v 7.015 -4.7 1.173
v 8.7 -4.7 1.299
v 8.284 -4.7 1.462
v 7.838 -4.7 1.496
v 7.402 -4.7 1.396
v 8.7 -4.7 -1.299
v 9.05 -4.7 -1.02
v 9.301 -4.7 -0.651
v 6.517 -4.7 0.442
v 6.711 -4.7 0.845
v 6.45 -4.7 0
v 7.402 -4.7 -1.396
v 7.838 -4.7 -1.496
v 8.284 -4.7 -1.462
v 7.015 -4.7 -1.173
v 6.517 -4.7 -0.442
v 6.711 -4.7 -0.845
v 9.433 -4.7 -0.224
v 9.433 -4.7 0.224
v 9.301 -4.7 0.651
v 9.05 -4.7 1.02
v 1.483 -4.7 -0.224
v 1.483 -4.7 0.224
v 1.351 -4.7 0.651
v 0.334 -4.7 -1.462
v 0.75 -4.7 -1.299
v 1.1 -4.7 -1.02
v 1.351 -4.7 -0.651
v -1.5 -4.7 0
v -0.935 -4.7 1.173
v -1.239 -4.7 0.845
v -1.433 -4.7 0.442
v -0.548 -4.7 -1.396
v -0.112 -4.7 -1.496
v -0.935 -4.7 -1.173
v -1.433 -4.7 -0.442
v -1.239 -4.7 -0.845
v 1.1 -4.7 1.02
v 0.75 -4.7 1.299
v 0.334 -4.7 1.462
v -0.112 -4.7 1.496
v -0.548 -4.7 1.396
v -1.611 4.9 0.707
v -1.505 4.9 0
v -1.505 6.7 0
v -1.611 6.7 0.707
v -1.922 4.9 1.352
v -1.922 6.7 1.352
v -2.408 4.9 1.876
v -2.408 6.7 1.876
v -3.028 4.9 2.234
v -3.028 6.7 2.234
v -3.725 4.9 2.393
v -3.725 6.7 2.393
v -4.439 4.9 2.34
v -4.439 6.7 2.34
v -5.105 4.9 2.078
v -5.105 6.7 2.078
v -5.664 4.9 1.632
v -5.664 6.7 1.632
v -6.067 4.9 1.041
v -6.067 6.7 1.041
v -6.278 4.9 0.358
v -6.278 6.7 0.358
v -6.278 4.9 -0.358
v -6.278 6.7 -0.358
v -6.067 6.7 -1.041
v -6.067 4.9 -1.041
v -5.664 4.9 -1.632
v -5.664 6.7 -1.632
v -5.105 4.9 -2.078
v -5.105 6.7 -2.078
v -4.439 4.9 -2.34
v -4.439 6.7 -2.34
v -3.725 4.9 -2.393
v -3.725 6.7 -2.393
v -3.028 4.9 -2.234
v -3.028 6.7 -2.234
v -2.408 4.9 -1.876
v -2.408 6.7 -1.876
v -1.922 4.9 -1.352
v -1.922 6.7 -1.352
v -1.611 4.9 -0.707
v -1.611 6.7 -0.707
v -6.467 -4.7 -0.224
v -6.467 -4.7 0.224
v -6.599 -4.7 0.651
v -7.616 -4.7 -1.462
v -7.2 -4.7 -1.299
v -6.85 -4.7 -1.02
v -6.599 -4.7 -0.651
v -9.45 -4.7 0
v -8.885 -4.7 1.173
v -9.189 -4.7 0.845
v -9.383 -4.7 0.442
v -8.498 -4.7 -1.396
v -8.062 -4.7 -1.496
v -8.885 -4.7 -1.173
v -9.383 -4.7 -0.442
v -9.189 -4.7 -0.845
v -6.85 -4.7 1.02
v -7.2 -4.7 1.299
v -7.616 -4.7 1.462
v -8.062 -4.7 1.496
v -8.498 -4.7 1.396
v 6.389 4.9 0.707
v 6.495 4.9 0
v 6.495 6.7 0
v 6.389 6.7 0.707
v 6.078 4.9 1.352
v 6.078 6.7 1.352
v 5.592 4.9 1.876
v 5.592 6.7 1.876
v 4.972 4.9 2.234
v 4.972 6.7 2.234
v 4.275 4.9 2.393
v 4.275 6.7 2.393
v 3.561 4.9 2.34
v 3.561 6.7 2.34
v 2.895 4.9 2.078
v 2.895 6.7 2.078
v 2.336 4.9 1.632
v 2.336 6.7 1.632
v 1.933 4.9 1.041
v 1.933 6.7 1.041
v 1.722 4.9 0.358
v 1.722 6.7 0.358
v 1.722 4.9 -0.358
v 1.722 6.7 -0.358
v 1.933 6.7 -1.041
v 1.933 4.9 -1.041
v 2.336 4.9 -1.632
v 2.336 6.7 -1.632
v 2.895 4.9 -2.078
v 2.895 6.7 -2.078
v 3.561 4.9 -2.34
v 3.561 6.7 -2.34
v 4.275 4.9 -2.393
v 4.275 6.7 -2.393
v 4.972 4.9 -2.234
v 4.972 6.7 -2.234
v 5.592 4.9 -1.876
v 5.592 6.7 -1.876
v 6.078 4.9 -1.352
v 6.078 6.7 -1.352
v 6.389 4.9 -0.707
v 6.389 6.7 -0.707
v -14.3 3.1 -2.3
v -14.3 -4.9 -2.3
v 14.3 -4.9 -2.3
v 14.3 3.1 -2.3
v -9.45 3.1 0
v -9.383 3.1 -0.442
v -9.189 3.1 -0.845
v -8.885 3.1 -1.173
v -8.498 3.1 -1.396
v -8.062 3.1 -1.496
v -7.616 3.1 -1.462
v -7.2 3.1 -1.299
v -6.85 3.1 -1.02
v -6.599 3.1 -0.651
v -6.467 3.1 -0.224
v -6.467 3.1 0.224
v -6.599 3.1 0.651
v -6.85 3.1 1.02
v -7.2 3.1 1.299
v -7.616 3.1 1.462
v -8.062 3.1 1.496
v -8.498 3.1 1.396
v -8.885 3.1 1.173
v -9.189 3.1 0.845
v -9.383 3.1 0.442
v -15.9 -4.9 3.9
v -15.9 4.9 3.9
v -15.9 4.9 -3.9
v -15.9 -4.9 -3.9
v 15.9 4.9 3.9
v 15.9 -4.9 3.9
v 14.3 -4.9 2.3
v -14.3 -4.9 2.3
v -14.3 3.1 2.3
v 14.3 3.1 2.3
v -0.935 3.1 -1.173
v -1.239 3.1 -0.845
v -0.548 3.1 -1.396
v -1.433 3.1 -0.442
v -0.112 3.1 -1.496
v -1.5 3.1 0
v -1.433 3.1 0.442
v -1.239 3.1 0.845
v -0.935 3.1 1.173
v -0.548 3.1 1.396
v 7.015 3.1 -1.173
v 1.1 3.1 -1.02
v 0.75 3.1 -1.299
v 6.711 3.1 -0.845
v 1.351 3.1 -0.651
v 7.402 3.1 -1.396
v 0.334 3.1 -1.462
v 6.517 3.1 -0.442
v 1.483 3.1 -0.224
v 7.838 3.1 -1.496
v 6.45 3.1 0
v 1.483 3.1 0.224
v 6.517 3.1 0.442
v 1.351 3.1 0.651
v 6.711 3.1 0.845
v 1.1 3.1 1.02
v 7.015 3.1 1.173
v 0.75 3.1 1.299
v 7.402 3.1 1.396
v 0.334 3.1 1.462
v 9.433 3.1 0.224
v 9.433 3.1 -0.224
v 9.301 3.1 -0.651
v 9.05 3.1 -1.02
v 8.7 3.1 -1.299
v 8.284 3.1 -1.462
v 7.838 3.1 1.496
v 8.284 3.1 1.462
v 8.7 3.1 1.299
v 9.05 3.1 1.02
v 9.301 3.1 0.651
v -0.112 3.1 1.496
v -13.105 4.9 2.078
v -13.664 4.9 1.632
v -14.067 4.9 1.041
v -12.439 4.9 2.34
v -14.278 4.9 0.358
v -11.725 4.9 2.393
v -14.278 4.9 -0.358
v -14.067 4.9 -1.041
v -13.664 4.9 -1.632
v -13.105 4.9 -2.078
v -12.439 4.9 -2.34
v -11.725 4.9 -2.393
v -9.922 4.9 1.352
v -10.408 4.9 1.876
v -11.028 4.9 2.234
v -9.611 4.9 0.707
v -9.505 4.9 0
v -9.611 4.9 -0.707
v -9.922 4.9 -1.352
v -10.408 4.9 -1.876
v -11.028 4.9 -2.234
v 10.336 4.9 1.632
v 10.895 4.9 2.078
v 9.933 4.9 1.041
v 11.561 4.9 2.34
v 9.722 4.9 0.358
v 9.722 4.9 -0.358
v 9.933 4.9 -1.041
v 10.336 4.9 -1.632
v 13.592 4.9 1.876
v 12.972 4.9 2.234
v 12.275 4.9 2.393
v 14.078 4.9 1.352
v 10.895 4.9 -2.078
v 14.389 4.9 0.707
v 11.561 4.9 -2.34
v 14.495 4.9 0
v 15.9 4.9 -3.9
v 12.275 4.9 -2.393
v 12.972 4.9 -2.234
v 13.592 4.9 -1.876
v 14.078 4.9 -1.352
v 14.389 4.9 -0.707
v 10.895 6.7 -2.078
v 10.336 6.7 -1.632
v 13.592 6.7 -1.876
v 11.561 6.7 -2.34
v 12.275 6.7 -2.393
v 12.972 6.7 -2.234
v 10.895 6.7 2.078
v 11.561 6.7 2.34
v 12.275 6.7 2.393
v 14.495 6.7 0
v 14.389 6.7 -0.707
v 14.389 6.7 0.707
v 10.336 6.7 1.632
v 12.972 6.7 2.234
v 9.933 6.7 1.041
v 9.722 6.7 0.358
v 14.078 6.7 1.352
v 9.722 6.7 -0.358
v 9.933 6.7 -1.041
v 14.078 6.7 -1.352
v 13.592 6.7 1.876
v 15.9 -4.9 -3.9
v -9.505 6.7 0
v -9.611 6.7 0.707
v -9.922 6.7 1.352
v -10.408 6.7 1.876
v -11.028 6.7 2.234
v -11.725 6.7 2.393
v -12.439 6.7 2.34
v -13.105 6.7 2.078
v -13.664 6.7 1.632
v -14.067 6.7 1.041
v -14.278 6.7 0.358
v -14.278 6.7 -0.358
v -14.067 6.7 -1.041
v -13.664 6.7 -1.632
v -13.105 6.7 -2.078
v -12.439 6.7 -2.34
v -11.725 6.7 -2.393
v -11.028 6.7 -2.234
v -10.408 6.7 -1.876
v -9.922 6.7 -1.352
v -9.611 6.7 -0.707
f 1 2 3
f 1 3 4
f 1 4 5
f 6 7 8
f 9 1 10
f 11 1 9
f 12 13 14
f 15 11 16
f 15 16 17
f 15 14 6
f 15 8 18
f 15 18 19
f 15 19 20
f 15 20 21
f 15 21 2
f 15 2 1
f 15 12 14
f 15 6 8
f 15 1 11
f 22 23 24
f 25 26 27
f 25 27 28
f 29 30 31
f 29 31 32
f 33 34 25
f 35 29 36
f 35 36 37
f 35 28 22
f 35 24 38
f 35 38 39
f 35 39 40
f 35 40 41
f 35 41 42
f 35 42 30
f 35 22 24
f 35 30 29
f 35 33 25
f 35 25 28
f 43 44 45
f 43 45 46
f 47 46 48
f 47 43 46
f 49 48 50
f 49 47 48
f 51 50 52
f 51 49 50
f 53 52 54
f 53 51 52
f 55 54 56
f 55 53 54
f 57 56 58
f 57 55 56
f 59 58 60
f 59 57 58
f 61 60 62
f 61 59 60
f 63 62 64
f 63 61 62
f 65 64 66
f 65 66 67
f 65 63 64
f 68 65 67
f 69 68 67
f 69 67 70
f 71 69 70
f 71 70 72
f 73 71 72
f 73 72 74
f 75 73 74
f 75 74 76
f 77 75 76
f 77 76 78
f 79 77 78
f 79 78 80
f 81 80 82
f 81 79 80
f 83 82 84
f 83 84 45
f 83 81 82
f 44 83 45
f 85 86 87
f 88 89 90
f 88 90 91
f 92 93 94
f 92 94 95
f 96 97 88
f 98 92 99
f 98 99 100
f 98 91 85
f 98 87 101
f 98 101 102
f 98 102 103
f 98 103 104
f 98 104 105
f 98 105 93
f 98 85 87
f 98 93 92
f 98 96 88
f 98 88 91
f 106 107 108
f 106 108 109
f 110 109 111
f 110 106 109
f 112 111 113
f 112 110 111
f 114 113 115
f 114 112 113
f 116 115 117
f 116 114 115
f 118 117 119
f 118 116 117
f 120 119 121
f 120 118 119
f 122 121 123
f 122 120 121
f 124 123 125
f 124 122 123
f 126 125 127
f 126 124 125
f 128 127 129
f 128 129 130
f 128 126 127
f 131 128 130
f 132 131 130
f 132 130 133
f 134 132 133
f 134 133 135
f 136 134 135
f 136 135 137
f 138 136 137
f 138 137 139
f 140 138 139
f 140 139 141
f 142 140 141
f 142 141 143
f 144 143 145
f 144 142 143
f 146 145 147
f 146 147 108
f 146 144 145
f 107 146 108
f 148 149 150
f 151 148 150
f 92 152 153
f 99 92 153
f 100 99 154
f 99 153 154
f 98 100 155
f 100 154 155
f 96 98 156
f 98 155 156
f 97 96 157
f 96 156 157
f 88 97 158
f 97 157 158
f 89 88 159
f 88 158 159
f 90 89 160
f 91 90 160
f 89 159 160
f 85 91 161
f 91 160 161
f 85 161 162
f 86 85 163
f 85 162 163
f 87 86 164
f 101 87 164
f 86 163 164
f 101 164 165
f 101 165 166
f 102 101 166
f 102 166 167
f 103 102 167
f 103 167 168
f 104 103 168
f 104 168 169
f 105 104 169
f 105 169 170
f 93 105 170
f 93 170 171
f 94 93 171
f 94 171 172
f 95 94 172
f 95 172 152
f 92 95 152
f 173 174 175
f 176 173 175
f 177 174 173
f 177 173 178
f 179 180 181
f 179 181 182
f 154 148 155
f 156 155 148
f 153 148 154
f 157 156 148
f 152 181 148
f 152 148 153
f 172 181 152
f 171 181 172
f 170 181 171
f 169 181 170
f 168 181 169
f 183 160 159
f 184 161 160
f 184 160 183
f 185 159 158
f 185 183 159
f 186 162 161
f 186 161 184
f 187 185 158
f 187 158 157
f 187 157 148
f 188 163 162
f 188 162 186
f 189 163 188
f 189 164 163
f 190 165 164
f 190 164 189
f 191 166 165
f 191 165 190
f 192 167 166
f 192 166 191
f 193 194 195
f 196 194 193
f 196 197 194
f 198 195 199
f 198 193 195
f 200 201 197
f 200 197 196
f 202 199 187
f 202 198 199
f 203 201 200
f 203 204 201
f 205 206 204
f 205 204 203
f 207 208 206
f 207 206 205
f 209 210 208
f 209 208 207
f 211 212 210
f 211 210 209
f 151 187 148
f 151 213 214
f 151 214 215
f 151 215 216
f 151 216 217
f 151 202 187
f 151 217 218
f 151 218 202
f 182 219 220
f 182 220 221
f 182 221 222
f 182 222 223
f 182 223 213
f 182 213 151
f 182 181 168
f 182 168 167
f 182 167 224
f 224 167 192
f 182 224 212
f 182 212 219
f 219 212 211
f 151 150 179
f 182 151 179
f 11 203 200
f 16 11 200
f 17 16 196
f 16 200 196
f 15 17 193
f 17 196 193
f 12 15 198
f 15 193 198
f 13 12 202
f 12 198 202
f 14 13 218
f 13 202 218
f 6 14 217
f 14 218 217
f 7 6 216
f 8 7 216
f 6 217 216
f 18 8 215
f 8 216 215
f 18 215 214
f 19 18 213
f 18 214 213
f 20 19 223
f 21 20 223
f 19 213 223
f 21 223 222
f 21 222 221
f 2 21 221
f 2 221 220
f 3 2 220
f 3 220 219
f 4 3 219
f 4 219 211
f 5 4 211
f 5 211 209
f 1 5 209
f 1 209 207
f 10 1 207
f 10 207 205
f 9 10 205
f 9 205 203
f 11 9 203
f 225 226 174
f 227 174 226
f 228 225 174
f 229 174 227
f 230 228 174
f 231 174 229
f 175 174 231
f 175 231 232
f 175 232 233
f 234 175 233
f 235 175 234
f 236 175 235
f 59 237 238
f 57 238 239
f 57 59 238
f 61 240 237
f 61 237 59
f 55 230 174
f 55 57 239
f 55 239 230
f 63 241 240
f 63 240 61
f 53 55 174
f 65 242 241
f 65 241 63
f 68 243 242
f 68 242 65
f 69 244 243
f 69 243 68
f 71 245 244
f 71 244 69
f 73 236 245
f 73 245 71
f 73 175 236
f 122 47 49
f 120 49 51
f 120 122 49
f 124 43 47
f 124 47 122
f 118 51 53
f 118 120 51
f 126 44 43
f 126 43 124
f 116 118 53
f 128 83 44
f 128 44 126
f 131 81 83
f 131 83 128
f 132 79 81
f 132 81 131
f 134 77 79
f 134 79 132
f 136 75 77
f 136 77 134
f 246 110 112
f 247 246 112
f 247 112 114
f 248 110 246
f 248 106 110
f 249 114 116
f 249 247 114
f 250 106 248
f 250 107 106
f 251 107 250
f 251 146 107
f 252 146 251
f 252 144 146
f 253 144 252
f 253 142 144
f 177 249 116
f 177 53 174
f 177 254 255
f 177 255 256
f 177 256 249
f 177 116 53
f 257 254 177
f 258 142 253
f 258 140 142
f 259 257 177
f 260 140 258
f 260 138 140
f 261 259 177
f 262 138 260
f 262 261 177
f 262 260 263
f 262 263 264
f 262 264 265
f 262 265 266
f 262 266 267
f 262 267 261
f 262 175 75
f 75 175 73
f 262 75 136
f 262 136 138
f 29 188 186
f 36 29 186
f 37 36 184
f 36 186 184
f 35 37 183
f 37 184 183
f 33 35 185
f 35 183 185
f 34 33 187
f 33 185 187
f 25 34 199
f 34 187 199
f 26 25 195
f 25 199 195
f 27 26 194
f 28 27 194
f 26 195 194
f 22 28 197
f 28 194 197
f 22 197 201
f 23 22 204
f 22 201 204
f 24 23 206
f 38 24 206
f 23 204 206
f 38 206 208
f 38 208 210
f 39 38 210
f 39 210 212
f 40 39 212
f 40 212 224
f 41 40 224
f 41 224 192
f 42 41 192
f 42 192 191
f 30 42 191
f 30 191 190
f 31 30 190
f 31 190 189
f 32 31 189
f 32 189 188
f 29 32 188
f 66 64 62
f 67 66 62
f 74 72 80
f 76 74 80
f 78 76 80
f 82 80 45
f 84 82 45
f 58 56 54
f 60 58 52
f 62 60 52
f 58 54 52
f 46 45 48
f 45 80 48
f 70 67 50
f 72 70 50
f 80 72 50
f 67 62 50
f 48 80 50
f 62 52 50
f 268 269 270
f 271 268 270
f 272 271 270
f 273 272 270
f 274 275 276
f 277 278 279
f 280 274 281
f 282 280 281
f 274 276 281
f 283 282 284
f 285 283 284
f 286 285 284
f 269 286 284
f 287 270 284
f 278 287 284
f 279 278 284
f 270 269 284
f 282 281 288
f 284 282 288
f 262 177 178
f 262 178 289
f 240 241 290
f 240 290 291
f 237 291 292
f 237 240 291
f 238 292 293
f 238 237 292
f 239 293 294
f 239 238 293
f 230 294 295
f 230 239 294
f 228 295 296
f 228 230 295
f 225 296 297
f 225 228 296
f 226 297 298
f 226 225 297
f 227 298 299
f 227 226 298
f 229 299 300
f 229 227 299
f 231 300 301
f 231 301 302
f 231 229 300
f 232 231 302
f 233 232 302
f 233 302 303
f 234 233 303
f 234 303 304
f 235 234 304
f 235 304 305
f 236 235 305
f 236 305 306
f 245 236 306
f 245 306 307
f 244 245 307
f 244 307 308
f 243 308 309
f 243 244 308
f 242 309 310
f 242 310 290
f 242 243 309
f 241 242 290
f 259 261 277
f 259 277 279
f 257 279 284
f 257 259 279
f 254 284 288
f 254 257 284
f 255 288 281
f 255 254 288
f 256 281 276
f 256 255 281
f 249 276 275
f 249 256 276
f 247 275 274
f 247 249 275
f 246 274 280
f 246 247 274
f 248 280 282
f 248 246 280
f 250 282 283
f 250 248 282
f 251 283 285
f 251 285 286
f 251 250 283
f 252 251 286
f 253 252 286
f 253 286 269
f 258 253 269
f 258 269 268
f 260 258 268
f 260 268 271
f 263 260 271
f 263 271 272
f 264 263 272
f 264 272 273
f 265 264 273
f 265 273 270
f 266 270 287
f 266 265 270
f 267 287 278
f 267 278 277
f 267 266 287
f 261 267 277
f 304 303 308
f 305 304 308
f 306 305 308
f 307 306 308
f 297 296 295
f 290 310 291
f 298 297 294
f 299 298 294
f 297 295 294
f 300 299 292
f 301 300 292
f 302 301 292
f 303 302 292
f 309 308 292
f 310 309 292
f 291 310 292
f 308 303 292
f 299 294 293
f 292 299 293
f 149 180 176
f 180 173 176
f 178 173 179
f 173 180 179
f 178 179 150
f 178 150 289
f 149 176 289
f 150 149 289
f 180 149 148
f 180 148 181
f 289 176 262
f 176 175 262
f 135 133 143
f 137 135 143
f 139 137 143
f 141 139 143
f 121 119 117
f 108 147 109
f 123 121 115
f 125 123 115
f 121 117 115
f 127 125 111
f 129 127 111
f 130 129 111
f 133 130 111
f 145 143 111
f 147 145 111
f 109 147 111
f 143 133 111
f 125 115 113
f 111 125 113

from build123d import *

# Parameters (mm, degrees)
SKETCH1_W           = 31.8
SKETCH1_H           = 7.8
BOSS_EXTRUDE1_DEPTH = 4.9
SKETCH2_R           = 2.4
BOSS_EXTRUDE2_DEPTH = 1.8
SKETCH3_W           = 28.6
SKETCH3_H           = 4.6
CUT_EXTRUDE1_DEPTH  = 8
SKETCH6_R           = 1.5
BOSS_EXTRUDE3_DEPTH = 8


with BuildPart() as part:
    # Sketch1 → Boss-Extrude1 (new body, symmetric)
    with BuildSketch(Plane(origin=(0, 0, 0), x_dir=(1, 0, 0), z_dir=(0, 1, 0))):
        Rectangle(SKETCH1_W, SKETCH1_H)
    extrude(amount=BOSS_EXTRUDE1_DEPTH, both=True)

    # Sketch2 → Boss-Extrude2 (add)
    with BuildSketch(Plane(origin=(15.9, 4.9, -3.9), x_dir=(1, 0, 0), z_dir=(0, -1, 0))):
        with Locations((-27.804807902, 3.9)):
            Circle(SKETCH2_R)
        with Locations((-19.804807902, 3.9)):
            Circle(SKETCH2_R)
        with Locations((-11.804807902, 3.9)):
            Circle(SKETCH2_R)
        with Locations((-3.804807902, 3.9)):
            Circle(SKETCH2_R)
    extrude(amount=-BOSS_EXTRUDE2_DEPTH)

    # Sketch3 → Cut-Extrude1 (cut)
    with BuildSketch(Plane.XZ.offset(4.9)):
        Rectangle(SKETCH3_W, SKETCH3_H)
    extrude(amount=-CUT_EXTRUDE1_DEPTH, mode=Mode.SUBTRACT)

    # Sketch6 → Boss-Extrude3 (add)
    with BuildSketch(Plane(origin=(15.9, 3.3, -3.9), x_dir=(-1, 0, 0), z_dir=(0, -1, 0))):
        with Locations((7.95, -3.9)):
            Circle(SKETCH6_R)
        with Locations((15.9, -3.9)):
            Circle(SKETCH6_R)
        with Locations((23.85, -3.9)):
            Circle(SKETCH6_R)
    extrude(amount=BOSS_EXTRUDE3_DEPTH)


solid = part.part
